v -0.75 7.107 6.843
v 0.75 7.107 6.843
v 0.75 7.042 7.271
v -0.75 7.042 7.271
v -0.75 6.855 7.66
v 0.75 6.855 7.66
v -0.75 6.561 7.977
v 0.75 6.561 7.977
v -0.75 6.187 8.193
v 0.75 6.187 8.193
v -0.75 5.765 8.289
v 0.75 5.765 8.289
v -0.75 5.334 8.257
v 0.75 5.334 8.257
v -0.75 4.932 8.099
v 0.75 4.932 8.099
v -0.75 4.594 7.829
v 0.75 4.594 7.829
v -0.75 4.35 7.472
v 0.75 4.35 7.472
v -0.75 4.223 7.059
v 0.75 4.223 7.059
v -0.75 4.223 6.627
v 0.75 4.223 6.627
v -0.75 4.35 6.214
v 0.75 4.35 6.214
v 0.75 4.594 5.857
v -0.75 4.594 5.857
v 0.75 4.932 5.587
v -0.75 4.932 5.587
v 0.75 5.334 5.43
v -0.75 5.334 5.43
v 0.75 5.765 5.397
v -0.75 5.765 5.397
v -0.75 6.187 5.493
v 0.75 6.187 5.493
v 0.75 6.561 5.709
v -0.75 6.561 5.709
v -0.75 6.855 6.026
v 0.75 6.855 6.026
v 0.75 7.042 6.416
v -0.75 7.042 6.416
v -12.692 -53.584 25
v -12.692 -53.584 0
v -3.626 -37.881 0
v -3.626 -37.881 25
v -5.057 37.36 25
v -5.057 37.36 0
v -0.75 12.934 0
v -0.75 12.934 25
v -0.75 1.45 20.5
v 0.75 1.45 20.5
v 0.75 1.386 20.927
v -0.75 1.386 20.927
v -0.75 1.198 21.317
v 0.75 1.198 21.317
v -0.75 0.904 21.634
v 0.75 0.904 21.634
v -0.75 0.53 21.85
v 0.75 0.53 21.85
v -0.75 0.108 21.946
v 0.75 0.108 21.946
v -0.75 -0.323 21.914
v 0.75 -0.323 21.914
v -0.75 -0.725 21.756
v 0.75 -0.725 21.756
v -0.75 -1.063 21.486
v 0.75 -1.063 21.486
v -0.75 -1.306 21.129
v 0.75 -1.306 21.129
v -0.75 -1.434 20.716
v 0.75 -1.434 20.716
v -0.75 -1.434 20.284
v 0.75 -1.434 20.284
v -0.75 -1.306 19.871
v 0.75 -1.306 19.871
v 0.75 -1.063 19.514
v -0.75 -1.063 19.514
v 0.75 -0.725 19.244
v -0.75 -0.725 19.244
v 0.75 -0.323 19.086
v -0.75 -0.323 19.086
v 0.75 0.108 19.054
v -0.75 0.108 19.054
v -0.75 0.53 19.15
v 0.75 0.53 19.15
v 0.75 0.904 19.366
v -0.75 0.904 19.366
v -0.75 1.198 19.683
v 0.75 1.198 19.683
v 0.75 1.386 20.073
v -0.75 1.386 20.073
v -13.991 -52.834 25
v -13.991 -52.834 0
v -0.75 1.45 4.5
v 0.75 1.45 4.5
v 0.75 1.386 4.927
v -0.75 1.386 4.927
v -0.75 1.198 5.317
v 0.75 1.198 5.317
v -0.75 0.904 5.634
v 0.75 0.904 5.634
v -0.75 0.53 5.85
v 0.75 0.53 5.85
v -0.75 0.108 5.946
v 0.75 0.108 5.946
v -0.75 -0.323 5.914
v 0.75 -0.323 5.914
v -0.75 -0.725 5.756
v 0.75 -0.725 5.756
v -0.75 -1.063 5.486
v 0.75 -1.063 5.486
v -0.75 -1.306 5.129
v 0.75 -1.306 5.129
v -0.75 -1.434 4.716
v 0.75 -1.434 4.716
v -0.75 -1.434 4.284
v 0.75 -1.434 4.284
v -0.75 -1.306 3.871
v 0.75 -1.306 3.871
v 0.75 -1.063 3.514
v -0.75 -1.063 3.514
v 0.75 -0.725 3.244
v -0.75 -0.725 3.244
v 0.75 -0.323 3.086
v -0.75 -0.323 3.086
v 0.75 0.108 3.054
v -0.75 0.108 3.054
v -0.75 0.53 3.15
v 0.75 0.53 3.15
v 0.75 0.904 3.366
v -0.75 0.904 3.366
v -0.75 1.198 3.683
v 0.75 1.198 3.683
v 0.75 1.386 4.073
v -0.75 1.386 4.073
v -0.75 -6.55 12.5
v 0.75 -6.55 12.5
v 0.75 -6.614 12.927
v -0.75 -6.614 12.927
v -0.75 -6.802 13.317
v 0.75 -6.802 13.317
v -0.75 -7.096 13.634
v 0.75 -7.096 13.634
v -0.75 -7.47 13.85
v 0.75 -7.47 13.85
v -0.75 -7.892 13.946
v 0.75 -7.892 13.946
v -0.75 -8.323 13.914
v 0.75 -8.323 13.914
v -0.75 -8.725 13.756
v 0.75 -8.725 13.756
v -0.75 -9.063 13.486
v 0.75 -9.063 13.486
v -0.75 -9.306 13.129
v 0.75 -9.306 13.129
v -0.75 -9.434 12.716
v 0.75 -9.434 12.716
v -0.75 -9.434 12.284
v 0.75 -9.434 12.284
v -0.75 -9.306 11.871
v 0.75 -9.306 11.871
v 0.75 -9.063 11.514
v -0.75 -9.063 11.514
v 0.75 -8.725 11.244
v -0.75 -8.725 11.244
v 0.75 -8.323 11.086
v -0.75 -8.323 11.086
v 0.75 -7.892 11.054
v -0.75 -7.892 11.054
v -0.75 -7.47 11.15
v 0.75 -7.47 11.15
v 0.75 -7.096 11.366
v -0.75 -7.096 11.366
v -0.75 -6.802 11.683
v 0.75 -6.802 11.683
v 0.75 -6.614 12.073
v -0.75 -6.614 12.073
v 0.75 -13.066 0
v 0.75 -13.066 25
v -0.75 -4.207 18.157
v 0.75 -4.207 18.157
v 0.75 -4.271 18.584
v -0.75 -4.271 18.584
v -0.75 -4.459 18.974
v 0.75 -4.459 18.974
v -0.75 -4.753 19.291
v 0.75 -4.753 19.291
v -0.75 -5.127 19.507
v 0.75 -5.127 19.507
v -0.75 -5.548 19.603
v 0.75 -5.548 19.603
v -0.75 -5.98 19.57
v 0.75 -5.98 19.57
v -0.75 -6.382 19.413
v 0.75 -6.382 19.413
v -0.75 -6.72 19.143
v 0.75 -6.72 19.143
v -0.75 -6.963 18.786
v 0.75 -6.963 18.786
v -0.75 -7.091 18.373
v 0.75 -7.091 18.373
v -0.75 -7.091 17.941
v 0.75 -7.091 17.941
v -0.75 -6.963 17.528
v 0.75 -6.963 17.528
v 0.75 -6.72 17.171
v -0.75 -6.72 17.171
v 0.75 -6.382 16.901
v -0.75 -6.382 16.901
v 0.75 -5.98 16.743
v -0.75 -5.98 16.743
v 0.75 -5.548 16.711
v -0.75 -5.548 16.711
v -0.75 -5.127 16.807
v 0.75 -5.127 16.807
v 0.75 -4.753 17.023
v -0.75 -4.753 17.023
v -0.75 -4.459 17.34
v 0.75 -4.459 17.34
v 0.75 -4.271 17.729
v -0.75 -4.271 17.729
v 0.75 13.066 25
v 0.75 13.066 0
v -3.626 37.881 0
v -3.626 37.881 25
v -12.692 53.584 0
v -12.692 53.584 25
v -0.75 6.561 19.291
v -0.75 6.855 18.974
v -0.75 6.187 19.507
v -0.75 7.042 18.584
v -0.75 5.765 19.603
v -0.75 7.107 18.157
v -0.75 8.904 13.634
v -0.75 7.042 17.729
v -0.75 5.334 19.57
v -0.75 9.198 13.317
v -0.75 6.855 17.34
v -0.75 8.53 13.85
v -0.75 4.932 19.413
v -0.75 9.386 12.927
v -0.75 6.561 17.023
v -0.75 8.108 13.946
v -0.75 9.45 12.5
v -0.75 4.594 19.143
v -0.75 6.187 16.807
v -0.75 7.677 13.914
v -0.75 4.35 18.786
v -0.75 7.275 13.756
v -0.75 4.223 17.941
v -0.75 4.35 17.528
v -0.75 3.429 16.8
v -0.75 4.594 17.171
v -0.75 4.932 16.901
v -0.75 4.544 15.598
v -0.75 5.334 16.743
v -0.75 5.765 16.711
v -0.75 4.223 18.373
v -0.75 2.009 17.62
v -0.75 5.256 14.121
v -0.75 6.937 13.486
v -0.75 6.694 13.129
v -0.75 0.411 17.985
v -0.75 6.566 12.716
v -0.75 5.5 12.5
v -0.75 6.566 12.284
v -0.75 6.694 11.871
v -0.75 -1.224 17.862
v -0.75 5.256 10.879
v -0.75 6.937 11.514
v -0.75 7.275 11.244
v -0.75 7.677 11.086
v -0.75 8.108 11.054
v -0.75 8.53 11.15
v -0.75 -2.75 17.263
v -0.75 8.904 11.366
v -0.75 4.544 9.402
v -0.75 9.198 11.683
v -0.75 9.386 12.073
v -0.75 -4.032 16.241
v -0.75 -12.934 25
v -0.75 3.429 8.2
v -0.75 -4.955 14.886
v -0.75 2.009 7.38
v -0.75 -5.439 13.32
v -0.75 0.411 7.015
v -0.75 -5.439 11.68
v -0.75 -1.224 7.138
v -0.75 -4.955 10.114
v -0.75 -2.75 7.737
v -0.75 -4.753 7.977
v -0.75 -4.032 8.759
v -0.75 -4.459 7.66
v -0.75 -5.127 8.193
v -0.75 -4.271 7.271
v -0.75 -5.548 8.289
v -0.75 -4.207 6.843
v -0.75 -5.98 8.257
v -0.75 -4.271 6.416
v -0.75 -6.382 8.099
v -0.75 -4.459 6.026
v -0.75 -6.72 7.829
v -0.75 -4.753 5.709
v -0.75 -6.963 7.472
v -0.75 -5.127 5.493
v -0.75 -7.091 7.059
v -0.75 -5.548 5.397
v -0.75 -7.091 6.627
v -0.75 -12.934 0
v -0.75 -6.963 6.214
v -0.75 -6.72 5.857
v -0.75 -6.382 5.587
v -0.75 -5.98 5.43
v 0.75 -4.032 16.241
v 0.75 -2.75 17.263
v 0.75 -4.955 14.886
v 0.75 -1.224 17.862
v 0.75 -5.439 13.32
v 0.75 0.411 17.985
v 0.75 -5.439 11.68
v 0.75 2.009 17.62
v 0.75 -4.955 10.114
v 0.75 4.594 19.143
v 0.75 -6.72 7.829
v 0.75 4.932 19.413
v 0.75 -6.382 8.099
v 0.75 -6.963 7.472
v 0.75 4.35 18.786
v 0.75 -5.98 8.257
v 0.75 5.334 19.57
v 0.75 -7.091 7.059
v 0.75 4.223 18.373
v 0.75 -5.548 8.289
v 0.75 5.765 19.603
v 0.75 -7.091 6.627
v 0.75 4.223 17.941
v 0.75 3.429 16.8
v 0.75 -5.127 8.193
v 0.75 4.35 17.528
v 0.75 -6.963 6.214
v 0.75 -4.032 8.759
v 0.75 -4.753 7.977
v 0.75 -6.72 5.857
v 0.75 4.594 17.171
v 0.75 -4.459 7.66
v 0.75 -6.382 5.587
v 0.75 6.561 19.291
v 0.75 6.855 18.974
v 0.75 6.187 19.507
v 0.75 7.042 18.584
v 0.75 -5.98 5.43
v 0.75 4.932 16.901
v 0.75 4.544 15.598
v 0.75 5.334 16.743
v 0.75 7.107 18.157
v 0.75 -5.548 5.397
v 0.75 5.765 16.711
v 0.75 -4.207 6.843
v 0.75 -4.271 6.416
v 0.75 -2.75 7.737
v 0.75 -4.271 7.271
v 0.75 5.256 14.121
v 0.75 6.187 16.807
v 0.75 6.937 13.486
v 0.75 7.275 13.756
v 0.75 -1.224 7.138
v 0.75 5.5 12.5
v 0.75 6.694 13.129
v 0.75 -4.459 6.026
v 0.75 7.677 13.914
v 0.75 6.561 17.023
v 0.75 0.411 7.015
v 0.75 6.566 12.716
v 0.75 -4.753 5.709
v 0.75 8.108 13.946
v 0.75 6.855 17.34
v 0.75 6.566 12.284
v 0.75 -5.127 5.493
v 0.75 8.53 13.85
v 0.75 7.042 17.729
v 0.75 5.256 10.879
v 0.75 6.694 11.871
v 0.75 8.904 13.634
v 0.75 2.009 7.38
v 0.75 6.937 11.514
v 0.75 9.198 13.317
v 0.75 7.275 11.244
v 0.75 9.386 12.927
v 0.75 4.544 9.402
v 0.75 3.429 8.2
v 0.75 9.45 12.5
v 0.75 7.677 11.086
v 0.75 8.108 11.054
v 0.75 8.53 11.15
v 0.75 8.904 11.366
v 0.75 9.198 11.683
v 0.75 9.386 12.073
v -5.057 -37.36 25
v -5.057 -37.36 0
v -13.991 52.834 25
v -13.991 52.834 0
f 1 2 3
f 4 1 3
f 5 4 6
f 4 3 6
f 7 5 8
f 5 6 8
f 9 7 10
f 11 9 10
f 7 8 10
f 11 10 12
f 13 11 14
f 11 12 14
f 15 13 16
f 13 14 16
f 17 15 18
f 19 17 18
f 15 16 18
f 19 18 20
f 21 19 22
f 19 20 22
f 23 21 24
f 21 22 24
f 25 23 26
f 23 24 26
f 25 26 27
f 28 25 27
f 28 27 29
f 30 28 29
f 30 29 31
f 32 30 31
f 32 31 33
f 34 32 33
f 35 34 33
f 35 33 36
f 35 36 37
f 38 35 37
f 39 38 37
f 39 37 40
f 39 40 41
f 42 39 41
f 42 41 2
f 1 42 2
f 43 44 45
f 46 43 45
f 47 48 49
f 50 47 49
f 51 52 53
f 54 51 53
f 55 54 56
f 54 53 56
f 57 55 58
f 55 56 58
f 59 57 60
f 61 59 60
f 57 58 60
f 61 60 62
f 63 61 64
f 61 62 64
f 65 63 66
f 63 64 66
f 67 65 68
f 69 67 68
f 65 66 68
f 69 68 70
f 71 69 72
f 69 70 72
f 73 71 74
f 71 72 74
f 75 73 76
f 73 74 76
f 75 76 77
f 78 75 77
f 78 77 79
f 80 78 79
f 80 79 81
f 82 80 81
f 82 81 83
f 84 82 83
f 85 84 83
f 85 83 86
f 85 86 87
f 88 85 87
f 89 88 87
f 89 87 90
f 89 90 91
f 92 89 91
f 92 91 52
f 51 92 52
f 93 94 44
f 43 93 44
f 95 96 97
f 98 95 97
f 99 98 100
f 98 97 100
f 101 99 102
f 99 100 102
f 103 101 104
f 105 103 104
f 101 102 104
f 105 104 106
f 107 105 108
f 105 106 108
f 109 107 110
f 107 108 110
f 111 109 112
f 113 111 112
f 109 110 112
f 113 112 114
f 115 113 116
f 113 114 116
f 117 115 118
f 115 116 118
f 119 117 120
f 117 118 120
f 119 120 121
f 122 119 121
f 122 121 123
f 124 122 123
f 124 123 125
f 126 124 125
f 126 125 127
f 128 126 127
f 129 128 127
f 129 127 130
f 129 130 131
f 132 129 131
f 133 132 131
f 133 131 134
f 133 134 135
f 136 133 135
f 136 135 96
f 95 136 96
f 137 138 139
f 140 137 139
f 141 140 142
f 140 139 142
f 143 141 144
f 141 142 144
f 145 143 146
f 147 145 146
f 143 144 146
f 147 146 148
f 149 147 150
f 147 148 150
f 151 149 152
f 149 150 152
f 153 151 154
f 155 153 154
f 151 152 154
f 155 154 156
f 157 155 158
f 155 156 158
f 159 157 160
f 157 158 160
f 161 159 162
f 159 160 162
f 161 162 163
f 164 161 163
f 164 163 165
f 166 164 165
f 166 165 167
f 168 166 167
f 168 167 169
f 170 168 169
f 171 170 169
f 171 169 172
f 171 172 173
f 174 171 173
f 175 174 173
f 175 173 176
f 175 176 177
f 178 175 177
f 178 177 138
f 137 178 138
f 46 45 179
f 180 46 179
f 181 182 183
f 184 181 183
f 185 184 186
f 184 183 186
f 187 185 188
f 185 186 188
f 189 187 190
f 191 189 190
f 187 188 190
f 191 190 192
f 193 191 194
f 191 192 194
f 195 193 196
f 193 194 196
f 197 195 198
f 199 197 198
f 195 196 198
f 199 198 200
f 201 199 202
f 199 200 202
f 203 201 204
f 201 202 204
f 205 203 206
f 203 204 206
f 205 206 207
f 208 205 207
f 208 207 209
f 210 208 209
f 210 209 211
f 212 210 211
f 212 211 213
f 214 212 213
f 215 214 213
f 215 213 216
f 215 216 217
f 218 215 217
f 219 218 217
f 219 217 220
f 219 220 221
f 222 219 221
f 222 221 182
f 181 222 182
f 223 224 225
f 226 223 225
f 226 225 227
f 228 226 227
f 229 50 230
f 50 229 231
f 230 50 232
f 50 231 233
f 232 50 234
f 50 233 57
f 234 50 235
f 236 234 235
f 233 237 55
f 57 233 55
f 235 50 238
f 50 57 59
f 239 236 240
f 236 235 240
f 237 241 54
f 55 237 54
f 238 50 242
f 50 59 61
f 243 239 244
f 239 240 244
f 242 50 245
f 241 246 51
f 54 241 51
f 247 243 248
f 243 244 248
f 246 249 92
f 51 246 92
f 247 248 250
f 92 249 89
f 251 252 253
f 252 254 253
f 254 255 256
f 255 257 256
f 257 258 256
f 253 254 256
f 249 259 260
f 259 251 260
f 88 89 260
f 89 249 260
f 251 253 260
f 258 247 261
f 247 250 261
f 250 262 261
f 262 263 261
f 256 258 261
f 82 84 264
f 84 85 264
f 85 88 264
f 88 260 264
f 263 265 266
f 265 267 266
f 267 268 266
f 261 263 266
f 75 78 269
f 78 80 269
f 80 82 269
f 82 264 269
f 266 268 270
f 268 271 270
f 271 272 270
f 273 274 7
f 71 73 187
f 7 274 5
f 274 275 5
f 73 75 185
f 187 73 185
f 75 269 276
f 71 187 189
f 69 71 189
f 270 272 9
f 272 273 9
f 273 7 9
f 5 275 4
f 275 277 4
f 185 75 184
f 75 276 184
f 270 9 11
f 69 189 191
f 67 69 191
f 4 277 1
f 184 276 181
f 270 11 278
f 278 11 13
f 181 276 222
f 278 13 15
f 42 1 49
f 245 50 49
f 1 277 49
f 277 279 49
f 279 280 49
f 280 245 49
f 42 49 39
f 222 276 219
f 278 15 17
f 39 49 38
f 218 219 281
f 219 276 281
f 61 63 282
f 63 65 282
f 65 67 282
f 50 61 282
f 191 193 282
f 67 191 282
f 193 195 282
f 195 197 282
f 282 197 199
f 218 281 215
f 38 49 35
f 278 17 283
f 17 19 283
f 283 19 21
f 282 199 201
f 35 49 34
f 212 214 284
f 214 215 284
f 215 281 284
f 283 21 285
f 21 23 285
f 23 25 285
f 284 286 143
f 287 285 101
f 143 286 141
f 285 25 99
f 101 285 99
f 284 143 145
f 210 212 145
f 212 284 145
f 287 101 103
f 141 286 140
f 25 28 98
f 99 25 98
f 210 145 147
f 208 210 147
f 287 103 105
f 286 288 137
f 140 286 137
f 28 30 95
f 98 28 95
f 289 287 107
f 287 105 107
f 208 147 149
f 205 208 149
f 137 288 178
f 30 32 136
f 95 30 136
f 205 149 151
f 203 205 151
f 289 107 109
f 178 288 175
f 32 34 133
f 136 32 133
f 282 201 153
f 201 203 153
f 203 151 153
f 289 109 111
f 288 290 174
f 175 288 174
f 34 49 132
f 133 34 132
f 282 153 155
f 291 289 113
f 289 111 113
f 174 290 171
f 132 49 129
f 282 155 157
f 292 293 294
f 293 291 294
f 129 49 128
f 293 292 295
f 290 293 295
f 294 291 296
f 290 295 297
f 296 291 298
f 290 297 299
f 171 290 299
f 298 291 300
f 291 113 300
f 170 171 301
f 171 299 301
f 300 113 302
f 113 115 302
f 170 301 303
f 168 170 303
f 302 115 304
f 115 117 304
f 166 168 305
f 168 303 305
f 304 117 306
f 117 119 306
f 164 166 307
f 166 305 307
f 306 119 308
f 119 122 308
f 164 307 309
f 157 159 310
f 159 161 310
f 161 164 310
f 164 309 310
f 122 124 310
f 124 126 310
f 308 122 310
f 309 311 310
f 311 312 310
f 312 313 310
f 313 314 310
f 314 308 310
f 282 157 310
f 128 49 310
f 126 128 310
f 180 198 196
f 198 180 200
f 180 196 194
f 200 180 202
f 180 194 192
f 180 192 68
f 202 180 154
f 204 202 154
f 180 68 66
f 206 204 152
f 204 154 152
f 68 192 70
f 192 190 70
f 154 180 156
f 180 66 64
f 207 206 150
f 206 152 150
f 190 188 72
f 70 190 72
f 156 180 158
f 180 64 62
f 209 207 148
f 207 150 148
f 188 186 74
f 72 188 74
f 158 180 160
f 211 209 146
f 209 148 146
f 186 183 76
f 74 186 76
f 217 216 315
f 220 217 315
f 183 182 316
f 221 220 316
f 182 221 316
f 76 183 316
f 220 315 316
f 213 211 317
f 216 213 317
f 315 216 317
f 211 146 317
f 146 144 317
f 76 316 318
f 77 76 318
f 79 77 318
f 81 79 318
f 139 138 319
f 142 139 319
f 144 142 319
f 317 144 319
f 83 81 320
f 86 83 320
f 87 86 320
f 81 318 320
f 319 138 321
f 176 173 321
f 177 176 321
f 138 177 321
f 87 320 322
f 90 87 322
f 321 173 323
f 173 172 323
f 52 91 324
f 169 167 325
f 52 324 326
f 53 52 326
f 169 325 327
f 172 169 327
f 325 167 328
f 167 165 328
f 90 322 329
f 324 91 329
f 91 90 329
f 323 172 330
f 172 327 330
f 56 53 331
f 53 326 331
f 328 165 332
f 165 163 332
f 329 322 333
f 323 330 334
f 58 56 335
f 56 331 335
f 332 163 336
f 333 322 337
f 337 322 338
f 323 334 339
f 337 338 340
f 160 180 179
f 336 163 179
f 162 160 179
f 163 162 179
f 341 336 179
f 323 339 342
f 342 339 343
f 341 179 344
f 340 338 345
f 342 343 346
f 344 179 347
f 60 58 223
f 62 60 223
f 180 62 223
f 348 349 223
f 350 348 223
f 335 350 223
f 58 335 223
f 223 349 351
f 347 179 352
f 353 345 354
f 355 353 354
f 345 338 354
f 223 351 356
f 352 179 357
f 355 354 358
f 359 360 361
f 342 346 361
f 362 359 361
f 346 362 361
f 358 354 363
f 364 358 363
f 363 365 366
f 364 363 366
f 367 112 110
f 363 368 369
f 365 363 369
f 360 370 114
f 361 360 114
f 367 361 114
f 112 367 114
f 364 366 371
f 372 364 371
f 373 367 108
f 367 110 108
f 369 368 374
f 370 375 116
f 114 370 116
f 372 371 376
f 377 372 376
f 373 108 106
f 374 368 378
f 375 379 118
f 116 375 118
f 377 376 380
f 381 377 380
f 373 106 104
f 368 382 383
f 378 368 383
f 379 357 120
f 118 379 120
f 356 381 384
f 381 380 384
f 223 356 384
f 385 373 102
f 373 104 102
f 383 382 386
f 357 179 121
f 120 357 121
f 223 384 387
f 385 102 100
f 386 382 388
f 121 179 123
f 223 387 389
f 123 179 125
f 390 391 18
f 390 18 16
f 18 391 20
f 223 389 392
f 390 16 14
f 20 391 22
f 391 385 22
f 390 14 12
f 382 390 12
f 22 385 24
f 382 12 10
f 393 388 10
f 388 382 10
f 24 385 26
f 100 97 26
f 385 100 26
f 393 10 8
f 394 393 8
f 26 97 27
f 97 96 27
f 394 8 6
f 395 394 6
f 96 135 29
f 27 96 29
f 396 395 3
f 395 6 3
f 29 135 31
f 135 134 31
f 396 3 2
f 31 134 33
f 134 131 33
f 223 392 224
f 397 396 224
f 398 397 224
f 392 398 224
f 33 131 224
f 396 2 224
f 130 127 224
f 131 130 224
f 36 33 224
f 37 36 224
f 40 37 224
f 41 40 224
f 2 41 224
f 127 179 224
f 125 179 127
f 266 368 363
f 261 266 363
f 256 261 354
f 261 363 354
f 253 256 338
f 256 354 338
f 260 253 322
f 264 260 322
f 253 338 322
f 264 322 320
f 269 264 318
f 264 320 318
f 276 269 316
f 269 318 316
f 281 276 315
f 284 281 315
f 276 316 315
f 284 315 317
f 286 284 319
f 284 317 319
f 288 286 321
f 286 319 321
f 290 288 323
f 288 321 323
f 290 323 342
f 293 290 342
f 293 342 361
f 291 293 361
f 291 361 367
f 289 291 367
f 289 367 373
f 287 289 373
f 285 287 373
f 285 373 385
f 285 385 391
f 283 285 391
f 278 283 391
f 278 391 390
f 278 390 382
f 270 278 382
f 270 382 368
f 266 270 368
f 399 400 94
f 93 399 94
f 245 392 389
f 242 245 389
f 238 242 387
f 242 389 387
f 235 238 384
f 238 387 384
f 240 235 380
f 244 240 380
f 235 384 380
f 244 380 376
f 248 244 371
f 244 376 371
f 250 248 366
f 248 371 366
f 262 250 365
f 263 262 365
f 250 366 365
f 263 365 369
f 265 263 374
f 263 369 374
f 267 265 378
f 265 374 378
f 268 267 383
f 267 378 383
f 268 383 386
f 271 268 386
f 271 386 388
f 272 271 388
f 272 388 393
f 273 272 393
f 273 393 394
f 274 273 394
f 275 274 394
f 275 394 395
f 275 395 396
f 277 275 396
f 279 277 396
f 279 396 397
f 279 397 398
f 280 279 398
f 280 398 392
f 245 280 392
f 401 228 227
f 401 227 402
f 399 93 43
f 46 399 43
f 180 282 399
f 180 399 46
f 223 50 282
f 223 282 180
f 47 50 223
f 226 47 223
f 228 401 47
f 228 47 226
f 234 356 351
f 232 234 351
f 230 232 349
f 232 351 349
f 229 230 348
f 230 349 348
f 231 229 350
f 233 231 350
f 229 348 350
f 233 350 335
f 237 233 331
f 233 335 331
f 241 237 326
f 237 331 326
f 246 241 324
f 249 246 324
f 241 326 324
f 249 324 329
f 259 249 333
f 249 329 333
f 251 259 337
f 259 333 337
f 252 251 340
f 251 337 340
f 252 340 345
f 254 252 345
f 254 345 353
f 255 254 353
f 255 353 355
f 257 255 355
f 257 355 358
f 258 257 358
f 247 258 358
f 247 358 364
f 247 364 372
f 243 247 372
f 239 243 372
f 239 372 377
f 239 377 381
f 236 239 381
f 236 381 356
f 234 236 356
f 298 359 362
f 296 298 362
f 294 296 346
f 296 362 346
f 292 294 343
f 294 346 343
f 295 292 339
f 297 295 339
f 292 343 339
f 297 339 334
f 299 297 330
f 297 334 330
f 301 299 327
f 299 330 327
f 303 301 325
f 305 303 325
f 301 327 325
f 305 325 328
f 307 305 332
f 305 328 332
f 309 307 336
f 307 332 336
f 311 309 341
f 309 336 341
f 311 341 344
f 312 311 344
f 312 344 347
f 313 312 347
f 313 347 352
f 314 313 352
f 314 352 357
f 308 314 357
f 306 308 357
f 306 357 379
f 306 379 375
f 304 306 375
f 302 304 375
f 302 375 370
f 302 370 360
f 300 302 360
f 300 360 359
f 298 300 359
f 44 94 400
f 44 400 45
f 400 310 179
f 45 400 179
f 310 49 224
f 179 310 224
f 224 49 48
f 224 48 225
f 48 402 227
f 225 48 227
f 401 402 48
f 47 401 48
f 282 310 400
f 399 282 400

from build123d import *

# Parameters (mm, degrees)
EXTRUDE_1_DEPTH     = 25
SKETCH_2_R          = 5.5
SKETCH_2_R_2        = 1.45
CUT_EXTRUDE_1_DEPTH = 10


with BuildPart() as part:
    # 草图1 → 拉伸-薄壁1 (new body)
    with BuildSketch(Plane.XY):
        Polygon((-13.990723495, 52.833651093), (-5.056846112, 37.359721559), (-0.75, 12.934383502), (-0.75, -12.934383502), (-5.056846112, -37.359721559), (-13.990723495, -52.833651093), (-12.691685389, -53.583651093), (-3.625562771, -37.880666092), (0.75, -13.065616498), (0.75, 13.065616498), (-3.625562771, 37.880666092), (-12.691685389, 53.583651093), align=None)
    extrude(amount=EXTRUDE_1_DEPTH)

    # 草图2 → 切除-拉伸1 (cut)
    with BuildSketch(Plane(origin=(0.75, 0, 0), x_dir=(0, 0, -1), z_dir=(1, 0, 0))):
        with Locations(Location((-12.5, 0, 0), (0, 0, 90))):
            Circle(SKETCH_2_R)
        with Locations(Location((-20.5, 0, 0), (0, 0, 90))):
            Circle(SKETCH_2_R_2)
        with Locations(Location((-18.156854249, 5.656854249, 0), (0, 0, 90))):
            Circle(SKETCH_2_R_2)
        with Locations(Location((-12.5, 8, 0), (0, 0, 90))):
            Circle(SKETCH_2_R_2)
        with Locations(Location((-6.843145751, 5.656854249, 0), (0, 0, 90))):
            Circle(SKETCH_2_R_2)
        with Locations(Location((-4.5, 0, 0), (0, 0, 90))):
            Circle(SKETCH_2_R_2)
        with Locations(Location((-6.843145751, -5.656854249, 0), (0, 0, 90))):
            Circle(SKETCH_2_R_2)
        with Locations(Location((-12.5, -8, 0), (0, 0, 90))):
            Circle(SKETCH_2_R_2)
        with Locations(Location((-18.156854249, -5.656854249, 0), (0, 0, 90))):
            Circle(SKETCH_2_R_2)
    extrude(amount=-CUT_EXTRUDE_1_DEPTH, mode=Mode.SUBTRACT)


solid = part.part
